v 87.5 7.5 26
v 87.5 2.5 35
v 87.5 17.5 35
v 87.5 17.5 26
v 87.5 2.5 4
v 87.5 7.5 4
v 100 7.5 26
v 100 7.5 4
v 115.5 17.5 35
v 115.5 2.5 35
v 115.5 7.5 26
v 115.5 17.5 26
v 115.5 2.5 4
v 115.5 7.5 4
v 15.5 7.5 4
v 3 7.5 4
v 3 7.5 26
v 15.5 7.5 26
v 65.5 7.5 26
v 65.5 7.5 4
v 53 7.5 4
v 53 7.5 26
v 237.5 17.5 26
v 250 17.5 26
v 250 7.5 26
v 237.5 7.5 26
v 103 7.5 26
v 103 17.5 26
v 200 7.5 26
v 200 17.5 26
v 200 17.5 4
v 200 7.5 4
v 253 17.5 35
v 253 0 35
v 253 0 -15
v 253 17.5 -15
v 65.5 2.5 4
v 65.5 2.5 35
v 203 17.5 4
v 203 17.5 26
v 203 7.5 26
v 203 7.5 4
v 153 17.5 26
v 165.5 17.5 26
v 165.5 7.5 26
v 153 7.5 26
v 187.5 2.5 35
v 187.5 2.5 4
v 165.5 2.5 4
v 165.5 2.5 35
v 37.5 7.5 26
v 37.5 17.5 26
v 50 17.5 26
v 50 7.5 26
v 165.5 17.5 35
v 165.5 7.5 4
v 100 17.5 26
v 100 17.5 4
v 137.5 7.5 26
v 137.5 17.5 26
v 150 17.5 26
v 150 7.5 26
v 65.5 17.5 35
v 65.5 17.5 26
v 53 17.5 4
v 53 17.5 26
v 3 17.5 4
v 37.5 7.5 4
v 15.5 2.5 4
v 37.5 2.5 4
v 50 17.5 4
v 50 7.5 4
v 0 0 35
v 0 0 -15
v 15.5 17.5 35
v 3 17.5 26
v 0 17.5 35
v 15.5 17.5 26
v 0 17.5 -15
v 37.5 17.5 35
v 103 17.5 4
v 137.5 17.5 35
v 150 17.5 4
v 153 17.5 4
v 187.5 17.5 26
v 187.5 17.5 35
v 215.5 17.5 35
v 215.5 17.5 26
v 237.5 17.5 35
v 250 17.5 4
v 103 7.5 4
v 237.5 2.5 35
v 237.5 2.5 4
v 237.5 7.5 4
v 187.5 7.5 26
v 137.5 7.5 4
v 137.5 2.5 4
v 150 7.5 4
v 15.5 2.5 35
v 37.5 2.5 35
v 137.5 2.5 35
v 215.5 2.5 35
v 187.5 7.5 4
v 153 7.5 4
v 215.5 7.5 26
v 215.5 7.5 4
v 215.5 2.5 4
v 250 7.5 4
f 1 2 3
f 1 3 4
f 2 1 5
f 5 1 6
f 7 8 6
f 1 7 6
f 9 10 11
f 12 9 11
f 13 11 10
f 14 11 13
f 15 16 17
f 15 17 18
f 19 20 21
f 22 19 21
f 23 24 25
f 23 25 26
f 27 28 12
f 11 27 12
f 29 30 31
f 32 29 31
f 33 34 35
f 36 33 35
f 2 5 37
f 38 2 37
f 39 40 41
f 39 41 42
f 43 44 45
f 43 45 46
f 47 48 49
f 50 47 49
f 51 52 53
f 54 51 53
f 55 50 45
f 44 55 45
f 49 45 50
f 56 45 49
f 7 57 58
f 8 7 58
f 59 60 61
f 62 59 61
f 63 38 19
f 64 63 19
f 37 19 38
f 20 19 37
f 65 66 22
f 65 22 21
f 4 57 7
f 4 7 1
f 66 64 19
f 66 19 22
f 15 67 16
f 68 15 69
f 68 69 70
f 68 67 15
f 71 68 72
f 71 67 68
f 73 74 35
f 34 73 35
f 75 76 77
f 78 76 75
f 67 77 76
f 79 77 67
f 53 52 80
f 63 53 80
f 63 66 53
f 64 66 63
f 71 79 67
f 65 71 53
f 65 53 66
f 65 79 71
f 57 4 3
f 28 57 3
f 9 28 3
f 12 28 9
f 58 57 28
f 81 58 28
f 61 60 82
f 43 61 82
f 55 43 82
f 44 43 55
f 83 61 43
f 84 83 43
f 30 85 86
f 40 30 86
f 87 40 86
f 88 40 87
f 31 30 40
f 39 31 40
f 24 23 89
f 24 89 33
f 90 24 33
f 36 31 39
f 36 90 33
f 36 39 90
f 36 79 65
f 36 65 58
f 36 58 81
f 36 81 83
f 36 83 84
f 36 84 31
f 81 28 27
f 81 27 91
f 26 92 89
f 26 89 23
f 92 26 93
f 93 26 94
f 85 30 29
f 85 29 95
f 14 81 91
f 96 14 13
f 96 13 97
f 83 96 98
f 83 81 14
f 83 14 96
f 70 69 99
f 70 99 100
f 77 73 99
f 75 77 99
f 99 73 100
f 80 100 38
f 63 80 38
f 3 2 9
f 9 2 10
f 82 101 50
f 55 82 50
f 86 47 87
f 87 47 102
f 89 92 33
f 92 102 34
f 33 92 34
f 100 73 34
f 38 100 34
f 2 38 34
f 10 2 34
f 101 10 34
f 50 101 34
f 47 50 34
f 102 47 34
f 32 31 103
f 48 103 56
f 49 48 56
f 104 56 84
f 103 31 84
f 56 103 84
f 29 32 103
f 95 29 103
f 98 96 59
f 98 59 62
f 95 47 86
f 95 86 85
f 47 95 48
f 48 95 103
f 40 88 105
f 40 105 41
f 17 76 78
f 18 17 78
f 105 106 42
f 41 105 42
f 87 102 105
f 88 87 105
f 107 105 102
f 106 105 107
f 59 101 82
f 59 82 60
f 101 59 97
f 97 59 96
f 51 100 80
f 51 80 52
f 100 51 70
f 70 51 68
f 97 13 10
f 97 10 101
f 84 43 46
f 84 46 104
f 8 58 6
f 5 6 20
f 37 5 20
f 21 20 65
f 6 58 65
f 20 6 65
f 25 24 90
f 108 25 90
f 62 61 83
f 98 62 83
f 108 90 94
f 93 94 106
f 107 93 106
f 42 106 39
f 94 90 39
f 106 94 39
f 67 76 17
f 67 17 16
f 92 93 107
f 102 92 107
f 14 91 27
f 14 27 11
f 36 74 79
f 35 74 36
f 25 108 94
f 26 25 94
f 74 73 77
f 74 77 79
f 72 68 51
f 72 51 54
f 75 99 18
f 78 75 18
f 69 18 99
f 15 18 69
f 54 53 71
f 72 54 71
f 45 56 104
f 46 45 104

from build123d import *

# Parameters (mm, degrees)
SKETCH1_W               = 253
SKETCH1_H               = 50
BOSS_EXTRUDE1_DEPTH     = 17.5
SKETCH2_W               = 47
SKETCH2_H               = 22
CUT_EXTRUDE1_DEPTH      = 10
SKETCH4_W               = 22
SKETCH4_H               = 31
CUT_EXTRUDE2_DEPTH      = 15
MIRROR2_COPY_1_SKETCH_W = 47
MIRROR2_COPY_1_SKETCH_H = 22
MIRROR2_COPY_1_DEPTH    = 10
MIRROR2_COPY_2_SKETCH_W = 22
MIRROR2_COPY_2_SKETCH_H = 31
MIRROR2_COPY_2_DEPTH    = 15


with BuildPart() as part:
    # Sketch1 → Boss-Extrude1 (new body)
    with BuildSketch(Plane(origin=(0, 0, 0), x_dir=(1, 0, 0), z_dir=(0, 1, 0))):
        with Locations((126.5, -10)):
            Rectangle(SKETCH1_W, SKETCH1_H)
    extrude(amount=BOSS_EXTRUDE1_DEPTH)

    # Sketch2 → Cut-Extrude1 (cut)
    with BuildSketch(Plane(origin=(0, 17.5, 0), x_dir=(1, 0, 0), z_dir=(0, 1, 0))):
        with Locations((26.5, -15)):
            Rectangle(SKETCH2_W, SKETCH2_H)
    cut_extrude1 = extrude(amount=-CUT_EXTRUDE1_DEPTH, mode=Mode.SUBTRACT)

    # Sketch4 → Cut-Extrude2 (cut)
    with BuildSketch(Plane(origin=(0, 17.5, 0), x_dir=(1, 0, 0), z_dir=(0, 1, 0))):
        with Locations((26.5, -19.5)):
            Rectangle(SKETCH4_W, SKETCH4_H)
    cut_extrude2 = extrude(amount=-CUT_EXTRUDE2_DEPTH, mode=Mode.SUBTRACT)

    # Mirror1: Cut-Extrude1, Cut-Extrude2 across plane
    add(cut_extrude1.mirror(Plane.ZY.offset(-51.5)), mode=Mode.SUBTRACT)
    add(cut_extrude2.mirror(Plane.ZY.offset(-51.5)), mode=Mode.SUBTRACT)

    # Mirror2: Cut-Extrude1, Cut-Extrude2 across plane
    add(cut_extrude1.mirror(Plane.ZY.offset(-101.5)), mode=Mode.SUBTRACT)
    add(cut_extrude2.mirror(Plane.ZY.offset(-101.5)), mode=Mode.SUBTRACT)

    # Mirror2 copy 1 sketch → Mirror2 copy 1 (cut)
    with BuildSketch(Plane(origin=(100, 17.5, 0), x_dir=(1, 0, 0), z_dir=(0, 1, 0))):
        with Locations((26.5, -15)):
            Rectangle(MIRROR2_COPY_1_SKETCH_W, MIRROR2_COPY_1_SKETCH_H)
    extrude(amount=-MIRROR2_COPY_1_DEPTH, mode=Mode.SUBTRACT)

    # Mirror2 copy 2 sketch → Mirror2 copy 2 (cut)
    with BuildSketch(Plane(origin=(100, 17.5, 0), x_dir=(1, 0, 0), z_dir=(0, 1, 0))):
        with Locations((26.5, -19.5)):
            Rectangle(MIRROR2_COPY_2_SKETCH_W, MIRROR2_COPY_2_SKETCH_H)
    extrude(amount=-MIRROR2_COPY_2_DEPTH, mode=Mode.SUBTRACT)

    # Mirror3: Cut-Extrude1, Cut-Extrude2 across plane
    add(cut_extrude1.mirror(Plane.ZY.offset(-126.5)), mode=Mode.SUBTRACT)
    add(cut_extrude2.mirror(Plane.ZY.offset(-126.5)), mode=Mode.SUBTRACT)


solid = part.part
